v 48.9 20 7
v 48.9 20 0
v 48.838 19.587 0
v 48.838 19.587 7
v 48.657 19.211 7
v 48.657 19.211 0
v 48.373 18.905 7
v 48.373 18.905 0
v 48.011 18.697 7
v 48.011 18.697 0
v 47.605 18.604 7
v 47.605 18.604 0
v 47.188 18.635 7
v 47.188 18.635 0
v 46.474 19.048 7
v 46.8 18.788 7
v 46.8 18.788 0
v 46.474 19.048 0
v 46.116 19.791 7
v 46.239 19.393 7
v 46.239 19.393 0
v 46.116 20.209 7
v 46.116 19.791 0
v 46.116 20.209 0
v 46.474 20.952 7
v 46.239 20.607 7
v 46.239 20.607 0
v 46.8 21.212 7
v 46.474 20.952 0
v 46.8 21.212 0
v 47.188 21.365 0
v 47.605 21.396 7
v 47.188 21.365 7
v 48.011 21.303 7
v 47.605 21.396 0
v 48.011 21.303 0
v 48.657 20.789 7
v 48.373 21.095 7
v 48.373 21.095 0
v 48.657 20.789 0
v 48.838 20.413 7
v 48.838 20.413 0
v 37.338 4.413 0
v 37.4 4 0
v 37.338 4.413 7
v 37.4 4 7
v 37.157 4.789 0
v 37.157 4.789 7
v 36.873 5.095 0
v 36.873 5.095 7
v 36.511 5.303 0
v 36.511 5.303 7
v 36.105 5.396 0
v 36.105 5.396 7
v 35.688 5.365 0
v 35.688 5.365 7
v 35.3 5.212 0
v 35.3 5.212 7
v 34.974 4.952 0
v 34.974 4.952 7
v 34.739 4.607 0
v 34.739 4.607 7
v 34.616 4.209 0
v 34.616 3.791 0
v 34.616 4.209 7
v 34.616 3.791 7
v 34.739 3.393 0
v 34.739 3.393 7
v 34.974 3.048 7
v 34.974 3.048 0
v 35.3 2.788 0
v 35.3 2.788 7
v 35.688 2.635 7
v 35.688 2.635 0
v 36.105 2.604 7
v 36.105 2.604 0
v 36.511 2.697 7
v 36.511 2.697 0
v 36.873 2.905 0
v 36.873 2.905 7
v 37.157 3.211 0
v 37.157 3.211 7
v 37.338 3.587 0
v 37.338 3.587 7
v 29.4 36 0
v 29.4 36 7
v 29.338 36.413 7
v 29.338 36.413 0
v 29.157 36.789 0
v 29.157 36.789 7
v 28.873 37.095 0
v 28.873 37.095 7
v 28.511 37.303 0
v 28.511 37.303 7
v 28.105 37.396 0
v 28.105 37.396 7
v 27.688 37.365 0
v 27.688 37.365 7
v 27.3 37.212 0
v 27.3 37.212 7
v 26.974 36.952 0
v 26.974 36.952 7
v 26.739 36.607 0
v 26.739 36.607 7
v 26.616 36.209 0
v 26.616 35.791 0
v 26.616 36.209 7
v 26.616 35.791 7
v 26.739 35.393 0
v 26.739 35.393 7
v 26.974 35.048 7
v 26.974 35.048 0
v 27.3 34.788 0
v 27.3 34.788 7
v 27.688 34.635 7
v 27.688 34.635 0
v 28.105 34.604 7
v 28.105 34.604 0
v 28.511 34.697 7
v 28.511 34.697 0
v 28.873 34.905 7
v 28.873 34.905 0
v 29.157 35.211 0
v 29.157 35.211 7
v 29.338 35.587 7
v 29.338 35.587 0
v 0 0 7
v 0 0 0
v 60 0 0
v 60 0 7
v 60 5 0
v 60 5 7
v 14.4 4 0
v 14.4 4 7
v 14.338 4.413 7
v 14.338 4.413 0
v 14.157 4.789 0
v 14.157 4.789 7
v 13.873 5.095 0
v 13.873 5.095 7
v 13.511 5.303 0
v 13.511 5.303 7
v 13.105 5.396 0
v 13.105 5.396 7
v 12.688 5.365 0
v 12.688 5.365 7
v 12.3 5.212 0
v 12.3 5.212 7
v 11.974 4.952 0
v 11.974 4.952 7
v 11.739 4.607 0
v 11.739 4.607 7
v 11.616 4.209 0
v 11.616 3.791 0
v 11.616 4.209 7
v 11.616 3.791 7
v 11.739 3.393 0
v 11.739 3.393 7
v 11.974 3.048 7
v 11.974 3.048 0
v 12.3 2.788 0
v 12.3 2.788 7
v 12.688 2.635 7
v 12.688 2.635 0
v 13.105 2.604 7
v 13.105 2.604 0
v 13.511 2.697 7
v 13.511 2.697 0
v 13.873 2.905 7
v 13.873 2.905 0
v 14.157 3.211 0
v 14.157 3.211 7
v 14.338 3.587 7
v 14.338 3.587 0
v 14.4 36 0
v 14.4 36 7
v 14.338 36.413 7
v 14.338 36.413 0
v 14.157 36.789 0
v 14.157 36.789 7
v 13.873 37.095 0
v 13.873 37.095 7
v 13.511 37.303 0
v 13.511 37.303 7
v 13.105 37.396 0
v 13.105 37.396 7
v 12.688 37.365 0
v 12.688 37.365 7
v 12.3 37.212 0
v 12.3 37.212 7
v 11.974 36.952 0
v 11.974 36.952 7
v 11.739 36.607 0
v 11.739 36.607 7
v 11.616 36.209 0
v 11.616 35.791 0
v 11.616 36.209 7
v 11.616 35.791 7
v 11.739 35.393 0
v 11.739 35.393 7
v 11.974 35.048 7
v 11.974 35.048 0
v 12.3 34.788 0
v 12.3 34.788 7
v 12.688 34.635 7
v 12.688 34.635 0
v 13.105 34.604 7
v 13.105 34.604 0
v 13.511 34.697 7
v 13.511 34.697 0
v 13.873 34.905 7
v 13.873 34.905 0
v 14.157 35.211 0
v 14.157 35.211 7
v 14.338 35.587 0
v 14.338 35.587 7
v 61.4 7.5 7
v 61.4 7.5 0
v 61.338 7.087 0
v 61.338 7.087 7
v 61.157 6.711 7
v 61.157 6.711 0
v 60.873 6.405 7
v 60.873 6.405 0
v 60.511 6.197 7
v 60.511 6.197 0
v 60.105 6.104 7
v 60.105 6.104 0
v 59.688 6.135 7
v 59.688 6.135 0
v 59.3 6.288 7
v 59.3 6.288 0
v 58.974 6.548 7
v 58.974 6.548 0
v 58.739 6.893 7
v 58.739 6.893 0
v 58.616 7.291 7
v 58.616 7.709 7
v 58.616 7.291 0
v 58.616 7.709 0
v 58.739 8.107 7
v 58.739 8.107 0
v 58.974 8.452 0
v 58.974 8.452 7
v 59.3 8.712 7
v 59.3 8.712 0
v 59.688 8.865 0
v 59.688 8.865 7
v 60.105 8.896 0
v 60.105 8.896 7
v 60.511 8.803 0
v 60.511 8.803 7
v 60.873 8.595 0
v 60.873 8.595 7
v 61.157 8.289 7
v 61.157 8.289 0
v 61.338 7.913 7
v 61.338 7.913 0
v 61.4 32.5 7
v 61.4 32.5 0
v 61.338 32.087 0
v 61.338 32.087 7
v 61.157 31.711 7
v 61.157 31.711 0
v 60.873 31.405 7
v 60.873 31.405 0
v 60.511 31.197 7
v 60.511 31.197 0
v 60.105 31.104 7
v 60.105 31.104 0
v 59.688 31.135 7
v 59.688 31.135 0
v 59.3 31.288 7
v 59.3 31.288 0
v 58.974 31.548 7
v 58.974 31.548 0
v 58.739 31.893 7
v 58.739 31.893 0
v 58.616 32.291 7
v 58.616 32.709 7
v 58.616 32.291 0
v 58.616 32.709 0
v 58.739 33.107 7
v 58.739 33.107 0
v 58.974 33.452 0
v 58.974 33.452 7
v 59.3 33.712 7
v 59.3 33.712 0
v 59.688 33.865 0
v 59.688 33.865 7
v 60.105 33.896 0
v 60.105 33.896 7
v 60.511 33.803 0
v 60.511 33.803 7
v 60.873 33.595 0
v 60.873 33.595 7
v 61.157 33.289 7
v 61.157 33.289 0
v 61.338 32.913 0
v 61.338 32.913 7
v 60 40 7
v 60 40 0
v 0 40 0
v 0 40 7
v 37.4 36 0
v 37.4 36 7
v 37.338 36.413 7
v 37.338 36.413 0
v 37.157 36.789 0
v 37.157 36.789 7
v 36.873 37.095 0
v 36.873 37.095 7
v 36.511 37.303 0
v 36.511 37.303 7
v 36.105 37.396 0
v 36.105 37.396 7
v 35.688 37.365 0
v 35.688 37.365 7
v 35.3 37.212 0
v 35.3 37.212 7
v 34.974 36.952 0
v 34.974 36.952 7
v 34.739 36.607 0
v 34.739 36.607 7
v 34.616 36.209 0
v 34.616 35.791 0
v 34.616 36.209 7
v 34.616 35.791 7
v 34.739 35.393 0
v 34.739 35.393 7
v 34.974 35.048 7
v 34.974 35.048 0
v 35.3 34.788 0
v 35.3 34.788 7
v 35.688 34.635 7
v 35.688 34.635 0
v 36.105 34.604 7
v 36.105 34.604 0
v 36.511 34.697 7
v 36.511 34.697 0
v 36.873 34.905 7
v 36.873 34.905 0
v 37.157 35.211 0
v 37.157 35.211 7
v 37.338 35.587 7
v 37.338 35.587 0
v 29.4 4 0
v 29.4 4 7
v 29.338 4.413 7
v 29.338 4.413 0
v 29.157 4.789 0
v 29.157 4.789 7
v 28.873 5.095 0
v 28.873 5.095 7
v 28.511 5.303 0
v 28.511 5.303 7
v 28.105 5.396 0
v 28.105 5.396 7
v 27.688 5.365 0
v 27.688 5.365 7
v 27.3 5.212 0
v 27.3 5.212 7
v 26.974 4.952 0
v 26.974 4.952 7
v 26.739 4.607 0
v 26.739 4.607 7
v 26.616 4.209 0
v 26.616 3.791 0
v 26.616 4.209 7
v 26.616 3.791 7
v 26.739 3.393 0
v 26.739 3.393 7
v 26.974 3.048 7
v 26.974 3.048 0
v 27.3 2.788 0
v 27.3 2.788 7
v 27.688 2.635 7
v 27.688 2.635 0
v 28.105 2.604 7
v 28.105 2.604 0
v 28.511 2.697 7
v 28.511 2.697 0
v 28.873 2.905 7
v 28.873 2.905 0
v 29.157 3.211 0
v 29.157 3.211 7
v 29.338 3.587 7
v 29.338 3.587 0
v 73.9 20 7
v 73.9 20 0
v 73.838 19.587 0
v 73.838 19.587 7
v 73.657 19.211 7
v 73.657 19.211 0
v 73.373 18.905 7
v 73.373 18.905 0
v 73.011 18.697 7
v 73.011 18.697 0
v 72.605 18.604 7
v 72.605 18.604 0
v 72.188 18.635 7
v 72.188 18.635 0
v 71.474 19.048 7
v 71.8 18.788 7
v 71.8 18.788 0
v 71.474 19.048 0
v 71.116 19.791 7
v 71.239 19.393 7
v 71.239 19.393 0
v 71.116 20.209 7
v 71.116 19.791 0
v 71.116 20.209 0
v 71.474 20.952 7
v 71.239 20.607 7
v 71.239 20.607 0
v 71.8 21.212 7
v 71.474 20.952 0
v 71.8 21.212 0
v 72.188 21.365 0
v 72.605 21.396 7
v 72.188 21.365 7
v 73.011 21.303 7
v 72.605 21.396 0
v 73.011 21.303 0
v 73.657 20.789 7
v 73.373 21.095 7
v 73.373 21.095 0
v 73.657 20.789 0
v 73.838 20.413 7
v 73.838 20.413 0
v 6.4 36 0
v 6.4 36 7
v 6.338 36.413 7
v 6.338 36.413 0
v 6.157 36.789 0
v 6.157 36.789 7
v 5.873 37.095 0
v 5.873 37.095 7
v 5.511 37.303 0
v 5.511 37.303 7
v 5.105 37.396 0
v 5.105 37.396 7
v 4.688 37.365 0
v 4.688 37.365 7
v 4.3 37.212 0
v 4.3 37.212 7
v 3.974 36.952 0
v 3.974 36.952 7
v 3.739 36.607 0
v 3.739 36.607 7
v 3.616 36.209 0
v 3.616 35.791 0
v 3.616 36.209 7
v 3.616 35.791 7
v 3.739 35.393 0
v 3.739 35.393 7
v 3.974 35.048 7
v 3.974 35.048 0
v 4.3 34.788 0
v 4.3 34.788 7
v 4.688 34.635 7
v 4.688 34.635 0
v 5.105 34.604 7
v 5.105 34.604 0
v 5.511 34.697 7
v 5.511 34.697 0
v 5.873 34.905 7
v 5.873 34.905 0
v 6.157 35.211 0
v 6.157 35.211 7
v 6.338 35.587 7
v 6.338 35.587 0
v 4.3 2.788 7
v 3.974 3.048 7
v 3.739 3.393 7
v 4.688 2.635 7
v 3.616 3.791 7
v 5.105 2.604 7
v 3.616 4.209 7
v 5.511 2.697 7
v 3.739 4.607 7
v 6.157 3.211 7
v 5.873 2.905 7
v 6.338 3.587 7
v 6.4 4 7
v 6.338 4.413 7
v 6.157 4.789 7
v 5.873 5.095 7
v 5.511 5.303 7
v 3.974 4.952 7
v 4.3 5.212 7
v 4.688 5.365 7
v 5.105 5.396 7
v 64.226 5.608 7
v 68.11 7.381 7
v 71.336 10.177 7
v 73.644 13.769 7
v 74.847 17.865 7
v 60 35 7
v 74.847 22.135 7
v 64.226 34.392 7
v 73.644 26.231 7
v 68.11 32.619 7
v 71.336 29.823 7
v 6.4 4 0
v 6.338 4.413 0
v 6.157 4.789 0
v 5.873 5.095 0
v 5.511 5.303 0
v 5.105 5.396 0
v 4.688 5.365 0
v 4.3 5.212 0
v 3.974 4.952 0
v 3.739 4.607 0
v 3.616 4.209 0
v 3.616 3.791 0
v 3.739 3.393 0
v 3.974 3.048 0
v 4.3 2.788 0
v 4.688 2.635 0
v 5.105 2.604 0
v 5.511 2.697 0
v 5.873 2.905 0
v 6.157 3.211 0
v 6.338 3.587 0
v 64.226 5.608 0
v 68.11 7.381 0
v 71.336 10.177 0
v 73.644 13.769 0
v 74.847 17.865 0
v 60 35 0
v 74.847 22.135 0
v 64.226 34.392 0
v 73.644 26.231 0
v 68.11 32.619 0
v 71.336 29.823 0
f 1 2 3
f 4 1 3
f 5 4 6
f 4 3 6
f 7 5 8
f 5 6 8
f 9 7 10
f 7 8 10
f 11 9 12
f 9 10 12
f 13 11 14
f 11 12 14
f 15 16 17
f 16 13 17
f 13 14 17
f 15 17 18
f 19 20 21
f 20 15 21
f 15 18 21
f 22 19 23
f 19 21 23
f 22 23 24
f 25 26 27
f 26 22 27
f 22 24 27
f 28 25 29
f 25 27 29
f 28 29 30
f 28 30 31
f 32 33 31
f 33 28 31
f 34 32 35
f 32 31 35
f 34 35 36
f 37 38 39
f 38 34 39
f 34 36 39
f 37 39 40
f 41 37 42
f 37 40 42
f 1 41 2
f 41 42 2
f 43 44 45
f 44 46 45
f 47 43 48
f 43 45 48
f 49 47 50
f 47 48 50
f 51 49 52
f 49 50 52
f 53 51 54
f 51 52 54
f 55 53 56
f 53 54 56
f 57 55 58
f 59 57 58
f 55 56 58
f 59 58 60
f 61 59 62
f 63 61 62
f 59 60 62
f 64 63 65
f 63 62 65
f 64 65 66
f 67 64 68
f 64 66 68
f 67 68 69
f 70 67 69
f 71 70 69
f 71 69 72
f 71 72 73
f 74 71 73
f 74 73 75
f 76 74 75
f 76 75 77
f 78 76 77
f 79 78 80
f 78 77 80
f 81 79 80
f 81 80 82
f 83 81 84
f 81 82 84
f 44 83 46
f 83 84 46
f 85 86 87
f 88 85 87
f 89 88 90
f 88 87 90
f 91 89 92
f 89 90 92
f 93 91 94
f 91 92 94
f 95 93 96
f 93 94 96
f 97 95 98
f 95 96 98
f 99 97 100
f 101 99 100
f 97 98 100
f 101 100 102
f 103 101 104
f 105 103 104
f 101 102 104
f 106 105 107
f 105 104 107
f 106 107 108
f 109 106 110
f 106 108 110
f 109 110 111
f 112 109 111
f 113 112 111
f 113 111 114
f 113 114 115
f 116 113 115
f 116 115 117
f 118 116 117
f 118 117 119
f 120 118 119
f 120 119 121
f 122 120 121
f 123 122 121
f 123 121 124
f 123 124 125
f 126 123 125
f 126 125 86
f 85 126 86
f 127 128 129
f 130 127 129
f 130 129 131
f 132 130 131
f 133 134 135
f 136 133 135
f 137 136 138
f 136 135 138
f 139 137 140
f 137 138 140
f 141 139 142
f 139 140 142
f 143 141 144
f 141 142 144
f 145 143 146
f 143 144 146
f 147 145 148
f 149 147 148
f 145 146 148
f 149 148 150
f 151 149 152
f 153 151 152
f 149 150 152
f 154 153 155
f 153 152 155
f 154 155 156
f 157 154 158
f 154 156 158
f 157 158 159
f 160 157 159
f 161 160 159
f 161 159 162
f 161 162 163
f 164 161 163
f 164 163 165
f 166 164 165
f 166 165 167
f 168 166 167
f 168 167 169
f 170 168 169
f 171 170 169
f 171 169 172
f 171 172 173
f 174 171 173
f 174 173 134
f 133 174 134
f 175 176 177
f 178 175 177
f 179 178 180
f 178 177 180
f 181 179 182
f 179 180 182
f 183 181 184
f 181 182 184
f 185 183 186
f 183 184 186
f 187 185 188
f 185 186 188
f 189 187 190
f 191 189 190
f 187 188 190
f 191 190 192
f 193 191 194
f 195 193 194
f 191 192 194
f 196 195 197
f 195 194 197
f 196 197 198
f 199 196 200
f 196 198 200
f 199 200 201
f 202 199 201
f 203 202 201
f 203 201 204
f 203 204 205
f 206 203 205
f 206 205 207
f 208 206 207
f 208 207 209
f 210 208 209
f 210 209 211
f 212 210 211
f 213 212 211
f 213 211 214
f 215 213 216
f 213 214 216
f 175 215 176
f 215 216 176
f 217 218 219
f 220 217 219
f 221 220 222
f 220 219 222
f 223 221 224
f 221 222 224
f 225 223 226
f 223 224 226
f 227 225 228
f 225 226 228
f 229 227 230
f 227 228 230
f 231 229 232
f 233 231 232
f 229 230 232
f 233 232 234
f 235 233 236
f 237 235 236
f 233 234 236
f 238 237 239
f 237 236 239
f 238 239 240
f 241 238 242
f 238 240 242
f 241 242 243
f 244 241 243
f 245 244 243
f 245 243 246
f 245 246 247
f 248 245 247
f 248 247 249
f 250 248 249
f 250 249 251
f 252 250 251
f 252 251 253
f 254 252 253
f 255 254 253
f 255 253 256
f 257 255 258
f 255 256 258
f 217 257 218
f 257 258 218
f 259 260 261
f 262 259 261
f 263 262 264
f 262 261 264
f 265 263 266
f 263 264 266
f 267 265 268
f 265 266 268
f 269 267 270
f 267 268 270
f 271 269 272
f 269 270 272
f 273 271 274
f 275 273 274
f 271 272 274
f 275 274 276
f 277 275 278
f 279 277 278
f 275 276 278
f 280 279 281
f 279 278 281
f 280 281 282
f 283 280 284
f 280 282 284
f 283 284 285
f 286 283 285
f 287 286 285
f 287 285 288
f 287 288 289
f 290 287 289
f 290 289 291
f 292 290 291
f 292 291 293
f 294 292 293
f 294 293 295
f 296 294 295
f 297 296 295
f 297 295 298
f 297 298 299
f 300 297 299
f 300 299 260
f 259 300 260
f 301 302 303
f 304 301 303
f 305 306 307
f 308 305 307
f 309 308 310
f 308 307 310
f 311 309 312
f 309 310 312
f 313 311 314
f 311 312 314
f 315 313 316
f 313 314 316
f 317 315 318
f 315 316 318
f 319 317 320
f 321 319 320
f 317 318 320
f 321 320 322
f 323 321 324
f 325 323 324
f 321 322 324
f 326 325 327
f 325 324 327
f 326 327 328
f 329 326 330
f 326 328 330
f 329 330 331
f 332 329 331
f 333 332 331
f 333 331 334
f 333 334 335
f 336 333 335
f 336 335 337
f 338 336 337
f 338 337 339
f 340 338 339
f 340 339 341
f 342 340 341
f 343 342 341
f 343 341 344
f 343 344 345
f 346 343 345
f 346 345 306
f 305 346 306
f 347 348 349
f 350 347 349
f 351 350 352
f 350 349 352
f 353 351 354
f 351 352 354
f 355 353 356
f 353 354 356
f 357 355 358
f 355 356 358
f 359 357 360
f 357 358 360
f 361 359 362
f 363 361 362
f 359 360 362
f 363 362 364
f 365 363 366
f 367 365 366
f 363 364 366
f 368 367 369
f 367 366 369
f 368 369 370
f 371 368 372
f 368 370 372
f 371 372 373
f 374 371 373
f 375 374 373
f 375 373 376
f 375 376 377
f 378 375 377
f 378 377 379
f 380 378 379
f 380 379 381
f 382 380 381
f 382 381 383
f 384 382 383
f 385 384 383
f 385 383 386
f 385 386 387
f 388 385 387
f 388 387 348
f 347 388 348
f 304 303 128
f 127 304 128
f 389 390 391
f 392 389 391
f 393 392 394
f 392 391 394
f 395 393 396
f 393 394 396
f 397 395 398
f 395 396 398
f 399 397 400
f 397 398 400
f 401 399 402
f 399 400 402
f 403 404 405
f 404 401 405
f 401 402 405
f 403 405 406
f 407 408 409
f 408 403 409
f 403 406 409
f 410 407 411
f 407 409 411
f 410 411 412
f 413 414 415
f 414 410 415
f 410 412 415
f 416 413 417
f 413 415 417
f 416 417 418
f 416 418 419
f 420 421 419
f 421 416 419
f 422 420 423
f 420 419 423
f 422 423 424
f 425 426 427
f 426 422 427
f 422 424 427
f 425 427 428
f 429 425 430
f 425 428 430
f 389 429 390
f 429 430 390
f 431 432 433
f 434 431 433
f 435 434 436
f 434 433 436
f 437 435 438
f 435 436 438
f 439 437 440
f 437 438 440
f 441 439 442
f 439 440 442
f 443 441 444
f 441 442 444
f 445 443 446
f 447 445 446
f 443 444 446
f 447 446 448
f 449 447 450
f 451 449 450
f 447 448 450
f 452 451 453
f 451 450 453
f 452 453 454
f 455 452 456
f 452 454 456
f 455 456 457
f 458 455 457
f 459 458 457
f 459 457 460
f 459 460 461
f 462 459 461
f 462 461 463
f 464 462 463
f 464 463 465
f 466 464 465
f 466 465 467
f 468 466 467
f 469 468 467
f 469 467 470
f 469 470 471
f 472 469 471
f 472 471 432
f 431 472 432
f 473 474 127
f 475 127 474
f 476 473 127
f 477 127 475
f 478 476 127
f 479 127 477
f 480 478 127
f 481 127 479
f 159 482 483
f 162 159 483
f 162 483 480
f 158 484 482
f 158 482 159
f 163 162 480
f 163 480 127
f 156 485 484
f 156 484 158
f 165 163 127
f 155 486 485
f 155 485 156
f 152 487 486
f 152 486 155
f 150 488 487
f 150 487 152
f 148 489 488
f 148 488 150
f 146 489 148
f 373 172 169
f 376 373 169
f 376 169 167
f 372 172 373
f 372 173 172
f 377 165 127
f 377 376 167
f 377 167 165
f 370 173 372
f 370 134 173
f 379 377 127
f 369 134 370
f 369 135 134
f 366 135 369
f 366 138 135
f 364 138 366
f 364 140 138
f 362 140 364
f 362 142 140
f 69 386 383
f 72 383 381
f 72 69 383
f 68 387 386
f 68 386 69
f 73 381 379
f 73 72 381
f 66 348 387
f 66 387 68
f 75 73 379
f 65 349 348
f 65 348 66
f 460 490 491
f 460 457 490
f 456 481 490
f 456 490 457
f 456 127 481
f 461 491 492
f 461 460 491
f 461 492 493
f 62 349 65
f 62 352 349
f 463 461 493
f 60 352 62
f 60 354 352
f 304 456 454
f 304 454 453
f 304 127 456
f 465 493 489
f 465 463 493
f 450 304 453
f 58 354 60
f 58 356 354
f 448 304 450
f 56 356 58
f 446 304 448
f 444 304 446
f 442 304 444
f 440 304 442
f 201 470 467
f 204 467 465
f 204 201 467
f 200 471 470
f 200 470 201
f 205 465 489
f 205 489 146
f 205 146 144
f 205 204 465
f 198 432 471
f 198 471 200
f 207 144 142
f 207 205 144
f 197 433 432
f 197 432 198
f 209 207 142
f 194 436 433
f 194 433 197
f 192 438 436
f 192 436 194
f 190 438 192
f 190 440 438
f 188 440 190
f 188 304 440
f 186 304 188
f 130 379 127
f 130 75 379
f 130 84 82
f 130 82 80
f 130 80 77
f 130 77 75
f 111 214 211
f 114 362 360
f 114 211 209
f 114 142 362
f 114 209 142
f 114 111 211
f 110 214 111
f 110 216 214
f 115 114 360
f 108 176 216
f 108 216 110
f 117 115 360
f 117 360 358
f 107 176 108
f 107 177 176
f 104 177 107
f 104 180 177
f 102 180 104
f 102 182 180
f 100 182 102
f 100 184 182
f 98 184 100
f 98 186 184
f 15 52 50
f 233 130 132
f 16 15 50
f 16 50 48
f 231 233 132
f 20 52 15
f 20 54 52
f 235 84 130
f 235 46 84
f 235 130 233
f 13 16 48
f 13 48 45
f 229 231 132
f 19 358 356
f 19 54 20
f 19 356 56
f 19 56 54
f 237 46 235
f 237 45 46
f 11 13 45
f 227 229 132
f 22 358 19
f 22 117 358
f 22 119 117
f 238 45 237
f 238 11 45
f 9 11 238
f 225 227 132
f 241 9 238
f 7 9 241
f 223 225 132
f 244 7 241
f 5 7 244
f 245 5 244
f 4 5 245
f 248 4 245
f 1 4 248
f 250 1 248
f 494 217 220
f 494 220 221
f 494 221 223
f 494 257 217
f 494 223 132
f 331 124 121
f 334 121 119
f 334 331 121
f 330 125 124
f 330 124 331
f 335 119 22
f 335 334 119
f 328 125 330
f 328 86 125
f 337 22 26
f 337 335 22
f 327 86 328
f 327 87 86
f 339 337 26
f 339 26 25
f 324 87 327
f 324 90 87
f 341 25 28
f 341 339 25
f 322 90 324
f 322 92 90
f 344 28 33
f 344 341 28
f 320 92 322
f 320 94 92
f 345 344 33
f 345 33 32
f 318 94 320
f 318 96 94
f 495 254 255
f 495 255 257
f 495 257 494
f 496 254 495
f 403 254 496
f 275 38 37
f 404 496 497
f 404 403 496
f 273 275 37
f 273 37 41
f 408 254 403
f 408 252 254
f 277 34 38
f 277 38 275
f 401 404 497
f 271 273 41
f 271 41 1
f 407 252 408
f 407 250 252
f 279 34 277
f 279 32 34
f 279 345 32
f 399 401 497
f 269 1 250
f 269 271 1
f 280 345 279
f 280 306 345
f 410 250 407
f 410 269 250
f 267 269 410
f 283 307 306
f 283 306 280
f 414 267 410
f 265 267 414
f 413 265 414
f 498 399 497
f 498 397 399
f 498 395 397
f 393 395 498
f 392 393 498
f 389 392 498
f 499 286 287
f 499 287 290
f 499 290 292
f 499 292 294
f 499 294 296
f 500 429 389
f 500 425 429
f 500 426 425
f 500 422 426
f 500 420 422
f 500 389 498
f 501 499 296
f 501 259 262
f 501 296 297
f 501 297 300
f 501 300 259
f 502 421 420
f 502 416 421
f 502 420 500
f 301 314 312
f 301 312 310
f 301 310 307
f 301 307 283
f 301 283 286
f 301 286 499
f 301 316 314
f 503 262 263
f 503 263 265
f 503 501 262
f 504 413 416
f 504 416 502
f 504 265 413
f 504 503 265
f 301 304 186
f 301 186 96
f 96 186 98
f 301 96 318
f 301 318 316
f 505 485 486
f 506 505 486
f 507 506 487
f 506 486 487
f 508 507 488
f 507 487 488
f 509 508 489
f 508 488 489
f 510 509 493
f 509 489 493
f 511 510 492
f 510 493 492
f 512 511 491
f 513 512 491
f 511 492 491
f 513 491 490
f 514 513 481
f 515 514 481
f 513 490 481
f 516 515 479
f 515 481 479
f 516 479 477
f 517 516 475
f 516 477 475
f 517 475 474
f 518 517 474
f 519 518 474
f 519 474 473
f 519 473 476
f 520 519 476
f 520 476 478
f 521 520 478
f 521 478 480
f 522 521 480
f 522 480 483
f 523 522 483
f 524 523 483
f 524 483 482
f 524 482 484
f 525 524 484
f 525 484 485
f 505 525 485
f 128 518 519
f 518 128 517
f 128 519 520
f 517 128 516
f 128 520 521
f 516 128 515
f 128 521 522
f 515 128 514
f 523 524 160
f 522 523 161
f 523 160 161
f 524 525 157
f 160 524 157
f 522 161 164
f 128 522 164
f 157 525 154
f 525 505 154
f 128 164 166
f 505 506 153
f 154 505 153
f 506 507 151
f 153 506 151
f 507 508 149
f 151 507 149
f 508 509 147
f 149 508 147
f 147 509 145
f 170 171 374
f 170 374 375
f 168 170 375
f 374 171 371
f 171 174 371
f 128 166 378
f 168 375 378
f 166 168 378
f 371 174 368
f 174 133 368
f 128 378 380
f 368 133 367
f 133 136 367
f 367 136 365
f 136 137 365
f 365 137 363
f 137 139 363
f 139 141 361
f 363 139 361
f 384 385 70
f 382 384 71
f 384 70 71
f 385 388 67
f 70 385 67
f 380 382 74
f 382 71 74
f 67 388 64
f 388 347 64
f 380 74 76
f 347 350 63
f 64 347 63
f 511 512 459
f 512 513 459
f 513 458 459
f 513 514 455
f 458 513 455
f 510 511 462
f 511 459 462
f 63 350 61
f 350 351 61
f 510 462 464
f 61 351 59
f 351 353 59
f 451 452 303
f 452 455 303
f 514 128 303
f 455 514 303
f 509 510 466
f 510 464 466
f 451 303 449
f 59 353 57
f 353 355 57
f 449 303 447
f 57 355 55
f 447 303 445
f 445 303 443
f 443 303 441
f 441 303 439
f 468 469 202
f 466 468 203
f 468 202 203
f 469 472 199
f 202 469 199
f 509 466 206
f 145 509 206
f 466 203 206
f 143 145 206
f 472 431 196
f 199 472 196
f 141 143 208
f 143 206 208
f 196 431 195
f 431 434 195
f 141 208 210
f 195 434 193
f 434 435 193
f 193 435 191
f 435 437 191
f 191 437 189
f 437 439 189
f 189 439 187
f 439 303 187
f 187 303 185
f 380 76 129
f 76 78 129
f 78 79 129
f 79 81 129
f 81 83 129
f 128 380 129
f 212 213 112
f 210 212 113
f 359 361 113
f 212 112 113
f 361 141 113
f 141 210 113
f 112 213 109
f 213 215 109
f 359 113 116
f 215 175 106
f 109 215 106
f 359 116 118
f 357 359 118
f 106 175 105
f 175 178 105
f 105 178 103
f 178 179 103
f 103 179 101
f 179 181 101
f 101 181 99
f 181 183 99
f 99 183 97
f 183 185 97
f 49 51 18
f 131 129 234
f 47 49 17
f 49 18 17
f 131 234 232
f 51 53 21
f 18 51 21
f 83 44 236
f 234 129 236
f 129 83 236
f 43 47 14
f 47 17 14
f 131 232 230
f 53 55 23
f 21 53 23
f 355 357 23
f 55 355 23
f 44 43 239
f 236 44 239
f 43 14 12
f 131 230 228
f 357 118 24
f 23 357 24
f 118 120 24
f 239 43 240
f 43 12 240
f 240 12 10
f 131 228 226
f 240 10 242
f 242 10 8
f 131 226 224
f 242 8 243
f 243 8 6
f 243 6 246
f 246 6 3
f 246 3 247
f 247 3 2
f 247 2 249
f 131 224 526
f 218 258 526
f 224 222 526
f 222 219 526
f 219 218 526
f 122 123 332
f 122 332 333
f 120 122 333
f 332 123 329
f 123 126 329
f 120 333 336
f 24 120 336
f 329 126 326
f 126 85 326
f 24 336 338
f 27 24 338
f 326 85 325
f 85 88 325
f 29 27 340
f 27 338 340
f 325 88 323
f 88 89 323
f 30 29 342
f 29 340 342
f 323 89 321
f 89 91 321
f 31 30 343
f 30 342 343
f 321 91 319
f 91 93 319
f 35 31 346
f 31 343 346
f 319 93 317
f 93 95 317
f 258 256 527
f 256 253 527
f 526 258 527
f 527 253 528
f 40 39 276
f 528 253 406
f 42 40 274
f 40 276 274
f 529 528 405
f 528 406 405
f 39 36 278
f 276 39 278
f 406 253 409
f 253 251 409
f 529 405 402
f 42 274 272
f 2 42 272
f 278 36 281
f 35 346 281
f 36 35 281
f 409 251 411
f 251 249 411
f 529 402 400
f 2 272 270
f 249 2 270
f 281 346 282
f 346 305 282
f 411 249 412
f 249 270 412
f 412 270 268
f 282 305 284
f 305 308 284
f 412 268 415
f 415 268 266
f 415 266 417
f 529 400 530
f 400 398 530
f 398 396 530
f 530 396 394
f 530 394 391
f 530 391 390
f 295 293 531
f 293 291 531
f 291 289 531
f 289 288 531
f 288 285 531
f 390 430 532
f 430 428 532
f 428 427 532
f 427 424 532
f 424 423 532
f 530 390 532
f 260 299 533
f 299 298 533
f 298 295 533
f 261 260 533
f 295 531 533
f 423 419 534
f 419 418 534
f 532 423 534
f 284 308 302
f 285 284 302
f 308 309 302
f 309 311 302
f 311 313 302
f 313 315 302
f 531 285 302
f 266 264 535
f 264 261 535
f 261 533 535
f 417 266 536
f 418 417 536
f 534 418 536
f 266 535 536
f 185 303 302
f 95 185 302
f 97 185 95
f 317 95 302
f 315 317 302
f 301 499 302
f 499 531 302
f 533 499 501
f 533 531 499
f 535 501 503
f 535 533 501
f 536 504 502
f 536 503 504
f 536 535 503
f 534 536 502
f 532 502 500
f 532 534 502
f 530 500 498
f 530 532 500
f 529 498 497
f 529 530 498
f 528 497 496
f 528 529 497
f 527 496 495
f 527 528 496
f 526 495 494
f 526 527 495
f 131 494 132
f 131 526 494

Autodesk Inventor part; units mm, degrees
ref_plane "YZ Plane" through (0, 0, 0) normal (1, 0, 0) x (0, 1, 0)
ref_plane "XZ Plane" through (0, 0, 0) normal (0, 1, 0) x (-1, 0, 0)
ref_plane "XY Plane" through (0, 0, 0) normal (0, 0, 1) x (1, 0, 0)
sketch "Sketch1" plane through (0, 0, 0) normal (0, 0, 1) x (1, 0, 0)
  line L0 (0, 0) -> (60, 0)
  line L1 (60, 0) -> (60, 40)
  line L2 (60, 40) -> (0, 40)
  line L3 (0, 40) -> (0, 0)
  circle A0 centre (60, 20) radius 15
  circle A1 centre (47.5, 20) radius 1.4
  circle A2 centre (60, 7.5) radius 1.4
  circle A3 centre (72.5, 20) radius 1.4
  circle A4 centre (60, 32.5) radius 1.4
  point P0 (60, 5)
  point P1 (60, 35)
  dimension "d0" = 60
  dimension "d1" = 40
  dimension "d2" = 30
  dimension "d3" = 2.8
  dimension "d4" = 12.5
  dimension "d7" = 360
extrude "Extrusion1" add sketch "Sketch1" along normal blind 7 contours L3 L2 L1 A0 L0 | A0 L1 A4 A2 | L1 A2 A4 A0
sketch "Sketch2" plane through (0, 0, 7) normal (0, 0, 1) x (1, 0, 0)
  line L0 (13, 36) -> (36, 36)
  line L1 (36, 36) -> (36, 4)
  line L2 (36, 4) -> (13, 4)
  line L3 (13, 4) -> (13, 36)
  line L4 (0, 40) -> (0, 0) projected
  circle A0 centre (13, 36) radius 1.4
  line L5 (0, 20) -> (36, 20)
  circle A1 centre (13, 4) radius 1.4
  line L6 (24.5, 36) -> (24.5, 4)
  circle A2 centre (36, 36) radius 1.4
  circle A3 centre (36, 4) radius 1.4
  dimension "d11" = 23
  dimension "d12" = 32
  dimension "d13" = 2.8
  dimension "d22" = 13
extrude "Extrusion2" cut sketch "Sketch2" against normal through all contours L3 A0 L0 | L0 A0 L3 | A2 L1 L0 | L0 L1 A2 | A1 L2 L3 | L3 L2 A1 | A3 L2 L1 | L1 L2 A3
sketch "Sketch3" plane through (0, 0, 7) normal (0, 0, 1) x (1, 0, 0)
  line L0 (5, 36) -> (28, 36)
  line L1 (28, 36) -> (28, 4)
  line L2 (28, 4) -> (5, 4)
  line L3 (5, 4) -> (5, 36)
  line L4 (0, 40) -> (0, 0) projected
  circle A0 centre (36, 36) radius 1.4 projected
  circle A1 centre (5, 36) radius 1.4
  line L5 (0, 20) -> (28, 20)
  circle A2 centre (5, 4) radius 1.4
  line L6 (16.5, 36) -> (16.5, 4)
  circle A3 centre (28, 36) radius 1.4
  circle A4 centre (28, 4) radius 1.4
  point P0 (5, 20)
  dimension "d16" = 23
  dimension "d17" = 32
  dimension "d18" = 8
  dimension "d19" = 2.8
extrude "Extrusion3" cut sketch "Sketch3" against normal through all contours L3 A1 L0 | L0 A1 L3 | A3 L1 L0 | L0 L1 A3 | A2 L2 L3 | L3 L2 A2 | A4 L2 L1 | L1 L2 A4
properties part number "üst döner tablo1"
